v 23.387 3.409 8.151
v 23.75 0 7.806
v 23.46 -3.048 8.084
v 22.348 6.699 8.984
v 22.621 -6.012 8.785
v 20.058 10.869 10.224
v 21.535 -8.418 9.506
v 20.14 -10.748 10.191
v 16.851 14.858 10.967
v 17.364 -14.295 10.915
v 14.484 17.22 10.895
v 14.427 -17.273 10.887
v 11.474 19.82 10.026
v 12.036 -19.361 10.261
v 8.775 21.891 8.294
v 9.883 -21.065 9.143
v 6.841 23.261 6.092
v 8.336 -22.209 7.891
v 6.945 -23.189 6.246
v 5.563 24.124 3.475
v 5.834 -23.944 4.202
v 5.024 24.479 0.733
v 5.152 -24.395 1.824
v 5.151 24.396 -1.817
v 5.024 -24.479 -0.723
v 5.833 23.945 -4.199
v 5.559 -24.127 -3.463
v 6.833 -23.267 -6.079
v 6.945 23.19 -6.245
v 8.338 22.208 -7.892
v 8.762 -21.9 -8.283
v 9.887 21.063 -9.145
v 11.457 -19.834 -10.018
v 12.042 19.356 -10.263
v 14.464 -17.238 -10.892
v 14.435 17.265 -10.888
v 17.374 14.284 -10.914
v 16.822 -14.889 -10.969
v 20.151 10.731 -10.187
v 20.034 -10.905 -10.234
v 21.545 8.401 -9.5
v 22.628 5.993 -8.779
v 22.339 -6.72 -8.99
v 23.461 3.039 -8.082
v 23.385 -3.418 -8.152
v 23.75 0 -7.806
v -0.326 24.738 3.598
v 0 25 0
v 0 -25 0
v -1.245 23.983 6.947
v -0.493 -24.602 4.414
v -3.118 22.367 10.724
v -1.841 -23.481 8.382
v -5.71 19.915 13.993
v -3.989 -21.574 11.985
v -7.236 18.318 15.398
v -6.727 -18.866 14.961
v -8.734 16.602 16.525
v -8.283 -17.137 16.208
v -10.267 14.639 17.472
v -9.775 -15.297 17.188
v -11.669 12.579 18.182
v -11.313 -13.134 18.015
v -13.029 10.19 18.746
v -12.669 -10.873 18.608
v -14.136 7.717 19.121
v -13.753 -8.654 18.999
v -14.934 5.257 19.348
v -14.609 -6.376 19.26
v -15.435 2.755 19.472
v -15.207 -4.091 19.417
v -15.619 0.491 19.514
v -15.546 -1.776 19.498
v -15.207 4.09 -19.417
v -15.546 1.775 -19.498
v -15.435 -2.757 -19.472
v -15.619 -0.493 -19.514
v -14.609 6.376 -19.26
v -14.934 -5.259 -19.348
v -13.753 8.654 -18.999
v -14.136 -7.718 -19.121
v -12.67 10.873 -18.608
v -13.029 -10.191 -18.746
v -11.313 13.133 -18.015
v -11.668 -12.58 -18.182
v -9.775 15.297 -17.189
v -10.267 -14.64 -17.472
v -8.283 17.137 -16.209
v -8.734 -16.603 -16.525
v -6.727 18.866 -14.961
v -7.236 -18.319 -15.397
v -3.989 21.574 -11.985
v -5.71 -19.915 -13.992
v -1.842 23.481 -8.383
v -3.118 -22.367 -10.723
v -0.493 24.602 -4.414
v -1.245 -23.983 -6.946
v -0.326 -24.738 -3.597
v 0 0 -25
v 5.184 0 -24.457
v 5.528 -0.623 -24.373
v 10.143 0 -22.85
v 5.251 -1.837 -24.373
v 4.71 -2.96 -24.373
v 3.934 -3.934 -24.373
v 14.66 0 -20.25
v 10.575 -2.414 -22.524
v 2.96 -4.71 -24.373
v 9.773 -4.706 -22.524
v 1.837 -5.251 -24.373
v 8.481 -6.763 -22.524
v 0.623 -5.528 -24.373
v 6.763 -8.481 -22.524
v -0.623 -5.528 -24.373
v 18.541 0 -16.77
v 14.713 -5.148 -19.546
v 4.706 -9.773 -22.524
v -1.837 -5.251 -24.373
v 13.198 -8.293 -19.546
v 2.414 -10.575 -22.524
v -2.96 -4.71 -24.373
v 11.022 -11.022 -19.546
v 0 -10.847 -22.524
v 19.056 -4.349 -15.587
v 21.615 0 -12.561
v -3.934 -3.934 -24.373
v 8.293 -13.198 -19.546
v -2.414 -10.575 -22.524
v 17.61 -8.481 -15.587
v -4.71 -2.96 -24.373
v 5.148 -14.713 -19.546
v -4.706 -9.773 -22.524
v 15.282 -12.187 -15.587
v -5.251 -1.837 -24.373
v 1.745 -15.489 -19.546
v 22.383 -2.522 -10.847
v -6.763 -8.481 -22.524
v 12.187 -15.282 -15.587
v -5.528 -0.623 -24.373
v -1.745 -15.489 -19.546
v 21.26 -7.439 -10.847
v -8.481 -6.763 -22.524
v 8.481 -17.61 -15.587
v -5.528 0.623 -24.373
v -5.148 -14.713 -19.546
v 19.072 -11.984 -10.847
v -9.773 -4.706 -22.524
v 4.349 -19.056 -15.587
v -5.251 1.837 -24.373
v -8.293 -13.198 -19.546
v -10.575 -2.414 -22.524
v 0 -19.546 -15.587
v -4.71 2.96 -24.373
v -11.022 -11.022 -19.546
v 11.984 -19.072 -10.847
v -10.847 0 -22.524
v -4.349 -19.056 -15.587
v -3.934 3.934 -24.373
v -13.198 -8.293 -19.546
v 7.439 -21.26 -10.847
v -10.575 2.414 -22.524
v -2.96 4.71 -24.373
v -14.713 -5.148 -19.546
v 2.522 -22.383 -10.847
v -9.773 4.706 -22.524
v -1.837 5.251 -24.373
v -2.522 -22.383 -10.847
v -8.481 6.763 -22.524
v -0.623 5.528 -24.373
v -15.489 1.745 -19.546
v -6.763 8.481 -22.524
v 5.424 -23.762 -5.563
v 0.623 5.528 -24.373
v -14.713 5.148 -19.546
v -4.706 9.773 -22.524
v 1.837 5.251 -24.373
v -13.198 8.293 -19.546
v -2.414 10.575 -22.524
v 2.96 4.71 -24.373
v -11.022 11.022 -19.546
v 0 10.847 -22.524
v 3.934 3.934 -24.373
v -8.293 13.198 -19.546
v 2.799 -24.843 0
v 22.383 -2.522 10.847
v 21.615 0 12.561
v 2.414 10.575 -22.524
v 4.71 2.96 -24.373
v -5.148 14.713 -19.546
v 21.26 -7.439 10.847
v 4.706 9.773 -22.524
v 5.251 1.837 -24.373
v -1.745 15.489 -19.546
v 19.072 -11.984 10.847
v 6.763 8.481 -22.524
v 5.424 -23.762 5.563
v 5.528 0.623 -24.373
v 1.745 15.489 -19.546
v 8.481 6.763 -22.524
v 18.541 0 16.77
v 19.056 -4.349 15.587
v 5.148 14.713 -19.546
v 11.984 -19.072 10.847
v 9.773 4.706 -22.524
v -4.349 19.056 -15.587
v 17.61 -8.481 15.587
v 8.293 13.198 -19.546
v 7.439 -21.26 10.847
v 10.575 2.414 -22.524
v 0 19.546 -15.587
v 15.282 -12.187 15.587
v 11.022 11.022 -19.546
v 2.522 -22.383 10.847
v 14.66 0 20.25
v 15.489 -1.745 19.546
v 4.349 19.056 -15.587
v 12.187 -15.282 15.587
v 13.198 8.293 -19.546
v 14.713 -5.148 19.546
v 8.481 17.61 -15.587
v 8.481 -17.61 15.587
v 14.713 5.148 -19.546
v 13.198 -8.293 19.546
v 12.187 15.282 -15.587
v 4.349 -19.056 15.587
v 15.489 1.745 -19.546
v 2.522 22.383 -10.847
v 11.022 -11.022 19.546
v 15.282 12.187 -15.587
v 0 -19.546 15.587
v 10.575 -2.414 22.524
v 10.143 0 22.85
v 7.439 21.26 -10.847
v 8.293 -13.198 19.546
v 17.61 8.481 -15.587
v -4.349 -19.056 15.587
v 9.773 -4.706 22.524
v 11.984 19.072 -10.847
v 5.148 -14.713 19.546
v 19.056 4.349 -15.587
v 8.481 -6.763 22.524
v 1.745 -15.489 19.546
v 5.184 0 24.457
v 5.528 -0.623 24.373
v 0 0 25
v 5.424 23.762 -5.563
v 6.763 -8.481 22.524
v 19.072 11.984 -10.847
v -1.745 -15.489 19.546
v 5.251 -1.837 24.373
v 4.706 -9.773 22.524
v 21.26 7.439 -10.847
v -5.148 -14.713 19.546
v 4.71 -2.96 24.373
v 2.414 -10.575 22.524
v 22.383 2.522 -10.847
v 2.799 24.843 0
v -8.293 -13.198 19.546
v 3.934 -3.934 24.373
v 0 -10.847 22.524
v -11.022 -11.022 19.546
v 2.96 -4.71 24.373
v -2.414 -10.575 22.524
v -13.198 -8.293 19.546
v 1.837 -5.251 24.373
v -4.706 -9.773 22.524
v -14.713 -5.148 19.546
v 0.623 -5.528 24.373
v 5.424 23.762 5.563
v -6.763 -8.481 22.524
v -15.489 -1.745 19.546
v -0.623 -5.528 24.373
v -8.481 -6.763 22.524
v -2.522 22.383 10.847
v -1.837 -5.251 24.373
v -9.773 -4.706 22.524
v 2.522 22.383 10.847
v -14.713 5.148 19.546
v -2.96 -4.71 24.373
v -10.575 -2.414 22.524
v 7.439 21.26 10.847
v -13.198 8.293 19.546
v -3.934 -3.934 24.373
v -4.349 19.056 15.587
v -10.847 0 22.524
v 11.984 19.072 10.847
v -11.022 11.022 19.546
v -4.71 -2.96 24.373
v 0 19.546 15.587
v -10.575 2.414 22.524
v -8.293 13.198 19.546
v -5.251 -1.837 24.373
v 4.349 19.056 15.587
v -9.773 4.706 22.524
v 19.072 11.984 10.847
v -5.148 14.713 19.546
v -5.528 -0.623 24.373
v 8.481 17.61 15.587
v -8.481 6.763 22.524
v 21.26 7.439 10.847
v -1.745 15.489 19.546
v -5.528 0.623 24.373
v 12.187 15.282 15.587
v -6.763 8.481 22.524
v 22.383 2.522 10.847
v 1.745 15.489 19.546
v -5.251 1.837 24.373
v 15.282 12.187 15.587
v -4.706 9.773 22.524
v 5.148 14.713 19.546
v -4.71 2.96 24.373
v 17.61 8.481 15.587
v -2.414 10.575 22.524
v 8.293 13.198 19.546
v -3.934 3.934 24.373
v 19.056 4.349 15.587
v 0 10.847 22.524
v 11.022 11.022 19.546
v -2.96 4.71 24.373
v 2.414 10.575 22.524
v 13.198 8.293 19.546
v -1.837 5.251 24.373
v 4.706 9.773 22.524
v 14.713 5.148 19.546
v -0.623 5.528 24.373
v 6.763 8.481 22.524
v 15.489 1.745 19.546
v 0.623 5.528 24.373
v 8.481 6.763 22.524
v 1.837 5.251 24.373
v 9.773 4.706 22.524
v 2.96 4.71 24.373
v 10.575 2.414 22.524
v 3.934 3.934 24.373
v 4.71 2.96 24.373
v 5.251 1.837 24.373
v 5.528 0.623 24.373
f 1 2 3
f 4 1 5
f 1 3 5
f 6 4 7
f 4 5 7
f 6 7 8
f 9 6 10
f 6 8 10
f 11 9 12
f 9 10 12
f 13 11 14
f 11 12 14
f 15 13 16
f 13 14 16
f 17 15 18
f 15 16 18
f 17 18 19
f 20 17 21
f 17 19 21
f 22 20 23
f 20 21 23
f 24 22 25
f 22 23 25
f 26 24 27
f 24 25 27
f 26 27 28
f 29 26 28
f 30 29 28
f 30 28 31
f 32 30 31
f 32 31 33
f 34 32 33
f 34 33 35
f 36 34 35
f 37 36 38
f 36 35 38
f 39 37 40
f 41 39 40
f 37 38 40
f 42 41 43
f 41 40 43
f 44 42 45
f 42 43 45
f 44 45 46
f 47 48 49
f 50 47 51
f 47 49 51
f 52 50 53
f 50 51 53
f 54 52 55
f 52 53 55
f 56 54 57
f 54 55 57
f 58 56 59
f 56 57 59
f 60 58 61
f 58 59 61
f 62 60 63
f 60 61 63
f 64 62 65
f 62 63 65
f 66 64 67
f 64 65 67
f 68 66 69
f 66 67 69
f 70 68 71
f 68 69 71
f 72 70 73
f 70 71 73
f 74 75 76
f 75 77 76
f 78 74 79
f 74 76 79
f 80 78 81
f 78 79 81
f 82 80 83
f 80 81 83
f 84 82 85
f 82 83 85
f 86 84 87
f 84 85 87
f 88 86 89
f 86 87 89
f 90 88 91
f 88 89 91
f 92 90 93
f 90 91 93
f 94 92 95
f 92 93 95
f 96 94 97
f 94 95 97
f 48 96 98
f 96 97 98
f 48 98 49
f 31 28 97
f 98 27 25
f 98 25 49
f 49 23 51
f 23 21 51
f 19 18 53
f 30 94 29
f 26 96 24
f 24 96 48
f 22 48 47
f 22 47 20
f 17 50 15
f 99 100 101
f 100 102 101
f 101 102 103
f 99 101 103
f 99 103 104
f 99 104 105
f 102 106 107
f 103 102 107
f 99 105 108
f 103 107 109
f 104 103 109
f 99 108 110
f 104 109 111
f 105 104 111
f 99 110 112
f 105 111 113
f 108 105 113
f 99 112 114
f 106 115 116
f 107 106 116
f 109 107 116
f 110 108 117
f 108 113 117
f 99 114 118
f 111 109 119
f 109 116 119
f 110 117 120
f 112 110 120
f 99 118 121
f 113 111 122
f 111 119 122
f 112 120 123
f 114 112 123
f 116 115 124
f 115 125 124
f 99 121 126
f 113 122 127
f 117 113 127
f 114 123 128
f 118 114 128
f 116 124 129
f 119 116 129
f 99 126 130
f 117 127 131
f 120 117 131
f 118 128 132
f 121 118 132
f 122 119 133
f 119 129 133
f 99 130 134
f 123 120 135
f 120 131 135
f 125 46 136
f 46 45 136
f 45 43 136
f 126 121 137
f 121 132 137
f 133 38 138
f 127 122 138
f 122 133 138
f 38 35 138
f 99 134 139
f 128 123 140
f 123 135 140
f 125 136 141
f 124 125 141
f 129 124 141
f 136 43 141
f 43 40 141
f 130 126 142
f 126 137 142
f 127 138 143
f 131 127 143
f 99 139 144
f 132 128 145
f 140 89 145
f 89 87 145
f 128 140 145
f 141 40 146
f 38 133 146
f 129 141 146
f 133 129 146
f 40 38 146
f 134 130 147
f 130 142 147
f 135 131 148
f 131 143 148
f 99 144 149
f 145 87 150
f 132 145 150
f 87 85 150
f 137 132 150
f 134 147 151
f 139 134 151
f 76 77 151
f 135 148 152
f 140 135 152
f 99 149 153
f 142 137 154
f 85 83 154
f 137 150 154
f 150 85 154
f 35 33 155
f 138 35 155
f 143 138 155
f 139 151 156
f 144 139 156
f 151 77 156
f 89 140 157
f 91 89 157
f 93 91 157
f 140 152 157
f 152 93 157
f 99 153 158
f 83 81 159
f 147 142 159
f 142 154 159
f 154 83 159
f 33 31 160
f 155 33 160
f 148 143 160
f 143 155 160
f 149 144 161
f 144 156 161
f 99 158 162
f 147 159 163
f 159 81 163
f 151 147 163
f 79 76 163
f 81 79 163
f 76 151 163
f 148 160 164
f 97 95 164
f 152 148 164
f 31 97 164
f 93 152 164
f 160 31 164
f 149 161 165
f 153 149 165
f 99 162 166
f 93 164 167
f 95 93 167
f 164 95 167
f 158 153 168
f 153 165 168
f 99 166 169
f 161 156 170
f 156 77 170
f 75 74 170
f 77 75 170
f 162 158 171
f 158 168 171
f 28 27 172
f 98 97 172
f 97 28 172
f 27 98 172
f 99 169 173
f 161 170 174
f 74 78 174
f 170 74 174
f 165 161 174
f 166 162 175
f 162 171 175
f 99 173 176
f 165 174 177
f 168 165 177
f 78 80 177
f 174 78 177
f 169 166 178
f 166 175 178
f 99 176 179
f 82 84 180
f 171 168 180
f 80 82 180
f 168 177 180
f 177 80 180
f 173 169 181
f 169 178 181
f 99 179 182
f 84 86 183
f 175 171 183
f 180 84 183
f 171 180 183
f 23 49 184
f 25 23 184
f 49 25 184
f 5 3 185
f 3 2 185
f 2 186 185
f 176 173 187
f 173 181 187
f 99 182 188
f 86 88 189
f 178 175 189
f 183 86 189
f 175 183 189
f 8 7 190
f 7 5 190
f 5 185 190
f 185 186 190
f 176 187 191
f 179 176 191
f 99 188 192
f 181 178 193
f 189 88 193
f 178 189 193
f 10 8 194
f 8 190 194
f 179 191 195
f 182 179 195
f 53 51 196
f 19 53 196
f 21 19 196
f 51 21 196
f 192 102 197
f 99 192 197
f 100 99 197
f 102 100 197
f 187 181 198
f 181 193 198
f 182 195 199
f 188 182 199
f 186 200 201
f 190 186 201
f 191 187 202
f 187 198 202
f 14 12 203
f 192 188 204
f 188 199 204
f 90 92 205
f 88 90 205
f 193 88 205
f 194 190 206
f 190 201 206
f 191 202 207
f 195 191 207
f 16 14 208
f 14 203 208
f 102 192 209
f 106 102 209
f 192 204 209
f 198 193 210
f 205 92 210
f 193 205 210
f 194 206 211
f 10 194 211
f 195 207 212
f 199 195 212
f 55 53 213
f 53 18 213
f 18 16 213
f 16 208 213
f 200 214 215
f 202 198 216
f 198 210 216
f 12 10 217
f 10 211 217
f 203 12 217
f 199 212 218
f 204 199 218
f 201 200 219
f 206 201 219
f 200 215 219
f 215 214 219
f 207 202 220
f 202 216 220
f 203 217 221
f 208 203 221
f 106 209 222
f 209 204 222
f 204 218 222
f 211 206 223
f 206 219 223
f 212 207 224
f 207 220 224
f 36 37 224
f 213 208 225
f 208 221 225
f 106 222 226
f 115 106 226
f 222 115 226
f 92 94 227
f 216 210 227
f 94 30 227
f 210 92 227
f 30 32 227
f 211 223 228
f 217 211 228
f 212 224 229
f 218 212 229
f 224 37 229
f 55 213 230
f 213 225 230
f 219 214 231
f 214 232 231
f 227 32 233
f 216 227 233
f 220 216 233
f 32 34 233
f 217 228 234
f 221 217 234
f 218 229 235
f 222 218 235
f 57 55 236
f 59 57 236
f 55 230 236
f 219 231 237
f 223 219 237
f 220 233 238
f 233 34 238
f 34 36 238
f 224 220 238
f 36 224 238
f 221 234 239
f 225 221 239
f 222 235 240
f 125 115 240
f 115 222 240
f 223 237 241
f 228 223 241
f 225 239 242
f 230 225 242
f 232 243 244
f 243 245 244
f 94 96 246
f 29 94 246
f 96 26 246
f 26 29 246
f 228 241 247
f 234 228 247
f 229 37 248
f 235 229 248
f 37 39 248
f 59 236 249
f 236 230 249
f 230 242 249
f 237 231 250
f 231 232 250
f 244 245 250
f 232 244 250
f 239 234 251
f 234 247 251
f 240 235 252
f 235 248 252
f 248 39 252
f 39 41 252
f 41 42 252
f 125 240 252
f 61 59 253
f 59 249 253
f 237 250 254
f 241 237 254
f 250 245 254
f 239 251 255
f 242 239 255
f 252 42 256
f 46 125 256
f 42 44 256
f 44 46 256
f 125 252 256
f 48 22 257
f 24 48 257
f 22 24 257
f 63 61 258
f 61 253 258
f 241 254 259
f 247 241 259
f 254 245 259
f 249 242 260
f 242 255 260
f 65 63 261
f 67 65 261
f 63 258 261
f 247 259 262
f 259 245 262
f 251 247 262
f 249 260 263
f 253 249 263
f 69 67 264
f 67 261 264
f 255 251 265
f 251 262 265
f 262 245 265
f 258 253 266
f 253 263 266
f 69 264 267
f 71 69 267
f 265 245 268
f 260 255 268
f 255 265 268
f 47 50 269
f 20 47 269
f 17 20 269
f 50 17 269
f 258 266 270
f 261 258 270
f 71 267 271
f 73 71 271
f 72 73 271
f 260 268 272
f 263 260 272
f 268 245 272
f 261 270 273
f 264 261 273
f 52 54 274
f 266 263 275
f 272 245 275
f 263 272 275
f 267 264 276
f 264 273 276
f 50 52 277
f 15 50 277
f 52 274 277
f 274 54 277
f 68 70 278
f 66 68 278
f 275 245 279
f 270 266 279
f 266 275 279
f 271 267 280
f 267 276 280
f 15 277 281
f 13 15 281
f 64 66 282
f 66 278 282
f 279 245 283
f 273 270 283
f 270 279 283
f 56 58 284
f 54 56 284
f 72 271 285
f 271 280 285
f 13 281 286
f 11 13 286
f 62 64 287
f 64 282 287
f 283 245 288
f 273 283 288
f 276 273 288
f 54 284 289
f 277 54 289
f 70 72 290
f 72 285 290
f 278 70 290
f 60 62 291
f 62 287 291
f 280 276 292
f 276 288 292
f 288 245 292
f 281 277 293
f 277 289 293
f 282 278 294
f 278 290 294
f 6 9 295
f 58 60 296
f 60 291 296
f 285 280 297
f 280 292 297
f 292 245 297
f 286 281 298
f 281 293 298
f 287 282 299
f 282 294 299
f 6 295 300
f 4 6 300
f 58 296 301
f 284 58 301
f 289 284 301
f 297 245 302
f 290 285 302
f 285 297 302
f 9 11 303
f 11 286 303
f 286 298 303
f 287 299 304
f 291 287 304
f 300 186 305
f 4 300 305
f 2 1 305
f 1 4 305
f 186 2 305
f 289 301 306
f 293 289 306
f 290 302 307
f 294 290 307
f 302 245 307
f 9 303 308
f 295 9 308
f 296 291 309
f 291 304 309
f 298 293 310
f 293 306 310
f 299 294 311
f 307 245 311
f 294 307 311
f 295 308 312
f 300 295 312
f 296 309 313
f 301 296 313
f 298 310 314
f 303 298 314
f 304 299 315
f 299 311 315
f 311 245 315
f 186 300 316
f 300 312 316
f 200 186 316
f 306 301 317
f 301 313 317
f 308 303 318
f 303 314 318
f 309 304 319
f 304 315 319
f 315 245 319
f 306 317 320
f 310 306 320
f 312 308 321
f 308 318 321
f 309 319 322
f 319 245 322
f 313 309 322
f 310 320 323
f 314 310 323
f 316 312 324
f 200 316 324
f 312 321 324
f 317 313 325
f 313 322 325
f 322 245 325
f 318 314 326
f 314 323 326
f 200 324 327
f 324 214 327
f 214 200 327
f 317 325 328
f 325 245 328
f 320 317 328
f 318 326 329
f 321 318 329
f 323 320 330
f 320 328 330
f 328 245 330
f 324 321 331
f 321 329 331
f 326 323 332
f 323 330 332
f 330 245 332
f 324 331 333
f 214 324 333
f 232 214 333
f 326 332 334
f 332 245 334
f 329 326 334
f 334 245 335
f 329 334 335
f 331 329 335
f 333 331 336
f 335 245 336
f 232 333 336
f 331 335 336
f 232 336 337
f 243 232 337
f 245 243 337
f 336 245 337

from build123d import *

# Parameters (mm, degrees)
F2_R     = 11
F3_DEPTH = 25
F4_R     = 20
F5_DEPTH = 25


with BuildPart() as f1:
    # F0 (on Front) → F1 (revolve)
    with BuildSketch(Plane.XZ):
        with BuildLine():
            Line((0, 25), (0, -25))
            ThreePointArc((0, -25), (25, 0), (0, 25))
        make_face()
    revolve(axis=Axis((0, 0, 0), (0, 0, -1)))

    # F2 (on Front) → F3 (cut, symmetric)
    with BuildSketch(Plane.XZ):
        with Locations((16, 0)):
            Circle(F2_R)
    extrude(amount=F3_DEPTH, both=True, mode=Mode.SUBTRACT)

    # F4 (on Front) → F5 (cut, symmetric)
    with BuildSketch(Plane.XZ):
        with Locations((-20, 0)):
            Circle(F4_R)
    extrude(amount=F5_DEPTH, both=True, mode=Mode.SUBTRACT)


solid = f1.part
